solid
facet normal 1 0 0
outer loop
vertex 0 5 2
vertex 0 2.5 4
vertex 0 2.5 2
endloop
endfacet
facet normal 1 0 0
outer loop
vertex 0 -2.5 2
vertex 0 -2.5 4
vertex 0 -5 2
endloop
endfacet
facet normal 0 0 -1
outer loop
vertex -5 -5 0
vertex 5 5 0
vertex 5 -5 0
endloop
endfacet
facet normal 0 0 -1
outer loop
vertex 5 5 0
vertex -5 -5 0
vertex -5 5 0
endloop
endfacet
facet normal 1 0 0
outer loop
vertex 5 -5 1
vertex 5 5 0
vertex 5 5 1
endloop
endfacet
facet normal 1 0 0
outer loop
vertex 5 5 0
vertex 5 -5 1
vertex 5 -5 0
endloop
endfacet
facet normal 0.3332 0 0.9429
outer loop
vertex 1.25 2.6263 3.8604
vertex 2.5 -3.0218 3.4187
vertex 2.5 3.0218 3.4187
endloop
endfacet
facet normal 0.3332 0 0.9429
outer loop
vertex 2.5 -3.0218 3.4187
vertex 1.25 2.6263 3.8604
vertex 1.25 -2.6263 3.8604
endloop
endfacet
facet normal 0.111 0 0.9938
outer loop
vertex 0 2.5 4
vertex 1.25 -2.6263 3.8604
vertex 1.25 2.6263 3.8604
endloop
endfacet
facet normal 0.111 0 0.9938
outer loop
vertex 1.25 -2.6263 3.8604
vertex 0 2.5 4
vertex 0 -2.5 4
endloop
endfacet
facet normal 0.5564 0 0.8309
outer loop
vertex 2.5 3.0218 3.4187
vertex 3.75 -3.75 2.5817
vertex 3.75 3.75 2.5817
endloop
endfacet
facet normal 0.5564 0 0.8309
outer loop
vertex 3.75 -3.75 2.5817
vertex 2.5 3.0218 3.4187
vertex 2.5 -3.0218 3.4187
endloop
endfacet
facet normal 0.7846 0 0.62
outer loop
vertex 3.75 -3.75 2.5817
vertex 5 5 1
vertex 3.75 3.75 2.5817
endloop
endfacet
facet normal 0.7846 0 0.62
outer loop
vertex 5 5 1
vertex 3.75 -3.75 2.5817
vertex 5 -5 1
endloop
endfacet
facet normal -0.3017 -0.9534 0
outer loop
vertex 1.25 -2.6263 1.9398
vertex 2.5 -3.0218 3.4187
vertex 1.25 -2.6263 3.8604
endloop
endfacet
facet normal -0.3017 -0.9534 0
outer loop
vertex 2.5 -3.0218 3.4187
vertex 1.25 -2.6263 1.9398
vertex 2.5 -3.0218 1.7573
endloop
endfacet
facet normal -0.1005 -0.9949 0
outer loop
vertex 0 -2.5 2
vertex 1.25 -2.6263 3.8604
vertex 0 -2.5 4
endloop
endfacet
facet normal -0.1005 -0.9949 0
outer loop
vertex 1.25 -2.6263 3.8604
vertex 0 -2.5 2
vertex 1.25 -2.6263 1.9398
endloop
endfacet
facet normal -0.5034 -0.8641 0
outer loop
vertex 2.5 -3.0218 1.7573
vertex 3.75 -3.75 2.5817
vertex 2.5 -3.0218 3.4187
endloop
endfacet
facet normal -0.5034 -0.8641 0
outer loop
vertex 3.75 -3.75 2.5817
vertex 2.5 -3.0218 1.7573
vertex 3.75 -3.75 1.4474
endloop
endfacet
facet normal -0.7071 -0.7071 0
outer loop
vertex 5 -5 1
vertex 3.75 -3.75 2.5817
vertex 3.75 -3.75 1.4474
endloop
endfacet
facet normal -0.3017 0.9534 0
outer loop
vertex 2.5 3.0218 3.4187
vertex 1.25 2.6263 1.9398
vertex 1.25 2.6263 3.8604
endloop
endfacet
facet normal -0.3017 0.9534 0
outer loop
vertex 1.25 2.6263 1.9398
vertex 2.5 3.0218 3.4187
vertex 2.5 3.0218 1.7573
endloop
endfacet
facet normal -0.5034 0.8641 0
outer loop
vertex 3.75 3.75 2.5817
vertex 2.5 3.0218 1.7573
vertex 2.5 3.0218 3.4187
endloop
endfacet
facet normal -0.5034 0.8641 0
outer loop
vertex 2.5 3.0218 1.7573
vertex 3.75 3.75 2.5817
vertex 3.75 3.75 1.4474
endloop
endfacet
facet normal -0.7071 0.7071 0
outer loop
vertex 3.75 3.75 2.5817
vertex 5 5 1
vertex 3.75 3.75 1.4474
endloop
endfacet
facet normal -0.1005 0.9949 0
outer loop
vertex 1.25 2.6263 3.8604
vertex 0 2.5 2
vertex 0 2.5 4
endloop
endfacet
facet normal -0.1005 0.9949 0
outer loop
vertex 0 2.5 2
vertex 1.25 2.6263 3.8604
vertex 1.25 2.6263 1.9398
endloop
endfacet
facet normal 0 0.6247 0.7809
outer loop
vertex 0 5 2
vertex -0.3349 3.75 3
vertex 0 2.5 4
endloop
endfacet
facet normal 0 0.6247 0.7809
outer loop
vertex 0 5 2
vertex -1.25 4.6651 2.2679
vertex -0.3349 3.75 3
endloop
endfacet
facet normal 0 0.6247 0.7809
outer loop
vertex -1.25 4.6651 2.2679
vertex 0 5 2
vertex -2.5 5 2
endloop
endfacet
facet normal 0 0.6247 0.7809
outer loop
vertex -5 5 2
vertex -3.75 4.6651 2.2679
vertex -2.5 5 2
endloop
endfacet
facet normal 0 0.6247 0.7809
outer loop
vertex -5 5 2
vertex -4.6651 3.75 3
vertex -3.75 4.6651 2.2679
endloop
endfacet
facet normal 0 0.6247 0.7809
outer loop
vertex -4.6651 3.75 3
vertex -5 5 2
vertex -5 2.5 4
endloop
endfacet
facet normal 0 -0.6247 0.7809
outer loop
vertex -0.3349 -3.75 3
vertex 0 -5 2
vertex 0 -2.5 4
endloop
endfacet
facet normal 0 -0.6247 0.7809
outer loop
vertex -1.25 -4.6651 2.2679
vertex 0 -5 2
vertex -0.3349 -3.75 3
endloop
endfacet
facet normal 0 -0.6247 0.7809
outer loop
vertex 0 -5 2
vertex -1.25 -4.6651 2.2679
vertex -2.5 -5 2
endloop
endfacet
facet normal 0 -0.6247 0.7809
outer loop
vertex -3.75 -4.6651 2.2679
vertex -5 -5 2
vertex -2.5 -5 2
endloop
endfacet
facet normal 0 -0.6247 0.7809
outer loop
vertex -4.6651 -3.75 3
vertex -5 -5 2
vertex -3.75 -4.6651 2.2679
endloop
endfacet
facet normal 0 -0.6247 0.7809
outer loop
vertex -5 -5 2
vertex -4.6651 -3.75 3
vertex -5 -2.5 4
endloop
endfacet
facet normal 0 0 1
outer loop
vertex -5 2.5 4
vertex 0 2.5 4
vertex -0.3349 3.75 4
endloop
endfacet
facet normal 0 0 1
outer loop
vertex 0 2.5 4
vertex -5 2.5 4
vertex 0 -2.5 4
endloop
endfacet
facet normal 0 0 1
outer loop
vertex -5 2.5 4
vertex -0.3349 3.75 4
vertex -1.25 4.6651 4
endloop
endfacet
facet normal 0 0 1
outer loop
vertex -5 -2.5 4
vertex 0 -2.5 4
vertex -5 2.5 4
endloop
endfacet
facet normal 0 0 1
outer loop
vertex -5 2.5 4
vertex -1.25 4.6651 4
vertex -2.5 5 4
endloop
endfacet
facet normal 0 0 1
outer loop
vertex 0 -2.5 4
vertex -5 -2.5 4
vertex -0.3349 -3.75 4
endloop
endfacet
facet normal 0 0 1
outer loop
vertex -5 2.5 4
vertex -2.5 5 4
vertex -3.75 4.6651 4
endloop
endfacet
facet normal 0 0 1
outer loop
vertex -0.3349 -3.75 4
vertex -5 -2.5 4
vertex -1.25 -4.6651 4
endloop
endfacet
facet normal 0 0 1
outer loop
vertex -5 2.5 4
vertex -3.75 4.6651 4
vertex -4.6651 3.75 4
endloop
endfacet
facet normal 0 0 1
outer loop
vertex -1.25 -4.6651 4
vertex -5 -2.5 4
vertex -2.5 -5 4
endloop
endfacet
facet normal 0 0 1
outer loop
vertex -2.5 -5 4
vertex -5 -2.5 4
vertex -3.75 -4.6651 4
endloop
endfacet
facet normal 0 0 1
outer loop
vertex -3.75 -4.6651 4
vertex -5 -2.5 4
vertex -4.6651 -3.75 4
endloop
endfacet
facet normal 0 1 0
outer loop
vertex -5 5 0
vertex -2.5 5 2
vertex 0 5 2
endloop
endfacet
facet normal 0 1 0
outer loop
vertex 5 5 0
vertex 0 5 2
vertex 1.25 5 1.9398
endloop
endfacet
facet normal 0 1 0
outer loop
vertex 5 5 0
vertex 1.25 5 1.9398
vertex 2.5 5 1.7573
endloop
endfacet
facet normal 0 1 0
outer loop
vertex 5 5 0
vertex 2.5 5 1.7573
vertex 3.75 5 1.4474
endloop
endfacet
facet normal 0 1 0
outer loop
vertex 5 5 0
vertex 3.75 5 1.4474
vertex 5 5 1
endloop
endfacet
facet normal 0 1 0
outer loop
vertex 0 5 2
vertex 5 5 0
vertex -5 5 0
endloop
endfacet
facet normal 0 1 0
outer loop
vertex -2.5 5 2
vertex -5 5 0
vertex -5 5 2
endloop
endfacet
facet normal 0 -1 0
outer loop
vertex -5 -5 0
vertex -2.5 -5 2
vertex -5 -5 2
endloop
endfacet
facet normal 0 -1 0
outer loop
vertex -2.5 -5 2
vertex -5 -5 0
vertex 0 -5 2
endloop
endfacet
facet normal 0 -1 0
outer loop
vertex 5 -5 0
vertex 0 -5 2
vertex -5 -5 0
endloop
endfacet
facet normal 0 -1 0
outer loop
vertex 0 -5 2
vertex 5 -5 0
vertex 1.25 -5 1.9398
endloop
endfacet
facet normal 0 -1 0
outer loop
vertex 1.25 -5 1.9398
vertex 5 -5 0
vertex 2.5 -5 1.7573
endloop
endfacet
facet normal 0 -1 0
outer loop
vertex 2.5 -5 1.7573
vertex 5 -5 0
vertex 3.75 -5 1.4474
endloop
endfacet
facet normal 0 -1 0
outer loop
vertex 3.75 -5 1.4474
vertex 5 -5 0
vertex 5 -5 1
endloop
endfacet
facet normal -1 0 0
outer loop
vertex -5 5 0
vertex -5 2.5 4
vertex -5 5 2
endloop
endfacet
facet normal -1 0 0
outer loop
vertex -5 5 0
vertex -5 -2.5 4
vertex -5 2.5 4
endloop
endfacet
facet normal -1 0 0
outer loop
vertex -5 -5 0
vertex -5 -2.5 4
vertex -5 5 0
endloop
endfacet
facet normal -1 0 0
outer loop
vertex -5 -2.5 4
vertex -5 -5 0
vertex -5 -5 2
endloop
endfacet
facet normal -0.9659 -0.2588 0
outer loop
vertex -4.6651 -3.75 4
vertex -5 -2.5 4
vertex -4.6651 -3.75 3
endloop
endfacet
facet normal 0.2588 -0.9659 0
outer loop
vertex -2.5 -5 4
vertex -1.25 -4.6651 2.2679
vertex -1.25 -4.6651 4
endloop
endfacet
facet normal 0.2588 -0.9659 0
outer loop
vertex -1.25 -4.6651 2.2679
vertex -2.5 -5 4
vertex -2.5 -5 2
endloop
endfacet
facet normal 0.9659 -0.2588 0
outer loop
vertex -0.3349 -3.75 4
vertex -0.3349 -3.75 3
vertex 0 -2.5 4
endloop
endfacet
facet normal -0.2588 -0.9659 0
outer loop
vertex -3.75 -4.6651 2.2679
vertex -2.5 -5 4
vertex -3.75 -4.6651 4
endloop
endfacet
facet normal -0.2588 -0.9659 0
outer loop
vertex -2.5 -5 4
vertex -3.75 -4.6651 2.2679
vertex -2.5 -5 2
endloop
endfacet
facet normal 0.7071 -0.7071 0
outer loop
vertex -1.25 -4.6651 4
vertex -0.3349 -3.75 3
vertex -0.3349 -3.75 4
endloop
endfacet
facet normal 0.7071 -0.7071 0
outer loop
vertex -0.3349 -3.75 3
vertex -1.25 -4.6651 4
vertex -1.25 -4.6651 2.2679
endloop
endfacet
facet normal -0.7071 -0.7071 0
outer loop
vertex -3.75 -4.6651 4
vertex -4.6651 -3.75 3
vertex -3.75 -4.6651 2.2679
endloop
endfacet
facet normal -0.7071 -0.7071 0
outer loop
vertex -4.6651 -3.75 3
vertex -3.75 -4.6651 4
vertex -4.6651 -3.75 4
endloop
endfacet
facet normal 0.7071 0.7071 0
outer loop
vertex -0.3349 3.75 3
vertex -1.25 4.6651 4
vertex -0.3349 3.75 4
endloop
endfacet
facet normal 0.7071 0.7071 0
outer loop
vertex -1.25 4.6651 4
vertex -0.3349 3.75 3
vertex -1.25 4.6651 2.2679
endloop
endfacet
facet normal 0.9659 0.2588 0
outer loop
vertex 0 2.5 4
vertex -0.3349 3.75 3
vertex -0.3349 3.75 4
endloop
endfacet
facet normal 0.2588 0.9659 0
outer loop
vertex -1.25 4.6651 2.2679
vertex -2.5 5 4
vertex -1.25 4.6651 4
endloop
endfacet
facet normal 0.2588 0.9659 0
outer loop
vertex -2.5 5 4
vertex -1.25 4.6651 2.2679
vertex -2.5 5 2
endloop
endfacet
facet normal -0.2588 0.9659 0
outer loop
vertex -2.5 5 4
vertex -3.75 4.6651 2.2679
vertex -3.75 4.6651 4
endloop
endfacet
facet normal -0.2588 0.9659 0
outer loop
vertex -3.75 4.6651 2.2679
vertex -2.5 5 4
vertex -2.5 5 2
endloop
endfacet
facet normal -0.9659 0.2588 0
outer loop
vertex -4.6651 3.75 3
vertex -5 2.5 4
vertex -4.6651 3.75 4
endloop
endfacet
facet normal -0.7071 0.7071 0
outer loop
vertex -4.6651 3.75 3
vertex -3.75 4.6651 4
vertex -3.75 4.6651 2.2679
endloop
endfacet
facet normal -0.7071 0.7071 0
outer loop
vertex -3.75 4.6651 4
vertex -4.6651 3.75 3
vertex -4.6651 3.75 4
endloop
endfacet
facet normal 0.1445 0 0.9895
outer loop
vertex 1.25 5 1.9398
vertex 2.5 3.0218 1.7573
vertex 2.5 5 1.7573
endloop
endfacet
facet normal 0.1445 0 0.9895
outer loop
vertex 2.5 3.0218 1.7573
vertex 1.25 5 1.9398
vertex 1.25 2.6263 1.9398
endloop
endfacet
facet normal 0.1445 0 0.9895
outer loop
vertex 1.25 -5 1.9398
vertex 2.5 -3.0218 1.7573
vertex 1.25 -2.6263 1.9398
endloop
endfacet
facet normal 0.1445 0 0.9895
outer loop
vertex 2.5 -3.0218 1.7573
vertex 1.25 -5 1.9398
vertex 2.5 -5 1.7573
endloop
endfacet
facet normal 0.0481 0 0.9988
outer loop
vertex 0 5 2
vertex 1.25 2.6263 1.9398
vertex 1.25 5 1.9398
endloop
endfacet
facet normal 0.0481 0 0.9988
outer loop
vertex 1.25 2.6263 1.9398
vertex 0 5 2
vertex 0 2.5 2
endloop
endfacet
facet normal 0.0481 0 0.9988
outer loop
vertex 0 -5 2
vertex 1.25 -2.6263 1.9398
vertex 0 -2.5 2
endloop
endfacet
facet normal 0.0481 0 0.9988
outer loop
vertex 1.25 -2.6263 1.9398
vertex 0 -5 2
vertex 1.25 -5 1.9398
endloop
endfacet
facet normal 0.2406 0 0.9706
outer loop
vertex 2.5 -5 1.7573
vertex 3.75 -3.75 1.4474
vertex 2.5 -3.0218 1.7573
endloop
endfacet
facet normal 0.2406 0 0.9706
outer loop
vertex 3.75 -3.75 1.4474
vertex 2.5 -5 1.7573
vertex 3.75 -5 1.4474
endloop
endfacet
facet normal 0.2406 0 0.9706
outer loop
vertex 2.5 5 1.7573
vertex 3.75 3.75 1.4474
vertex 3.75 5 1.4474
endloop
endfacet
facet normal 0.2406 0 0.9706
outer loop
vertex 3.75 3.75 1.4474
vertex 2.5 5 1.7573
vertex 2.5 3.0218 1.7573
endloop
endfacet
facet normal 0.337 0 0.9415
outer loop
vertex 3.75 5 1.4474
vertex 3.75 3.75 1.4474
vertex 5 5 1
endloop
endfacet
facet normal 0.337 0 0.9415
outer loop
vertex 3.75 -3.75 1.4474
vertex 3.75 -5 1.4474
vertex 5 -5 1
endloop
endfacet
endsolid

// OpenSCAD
// plate 2x2 bow

// external vars #########################

ext_scale = 1.0;

// internal vars #########################

pts_base = [[0,-5],[2,-5],[4,-2.5],[4,2.5],[2,5],[0,5]];

r_big = (sqrt(34)/2)/(3/sqrt(34));
r_big2 = r_big*r_big;
u_big = r_big-3;
pts_big = [
[0,0],[0,4],
[1.25,1+sqrt(r_big2-1.5625)-u_big],
[2.5,1+sqrt(r_big2-6.25)-u_big],
[3.75,1+sqrt(r_big2-14.0625)-u_big],
[5,1],[5,0]
];

r_side = (sqrt(31.25)/2)/(2.5/sqrt(31.25));
r_side2 = r_side*r_side;
u_side = r_side-2.5;
pts_side = [
[-1,-1],[0,2.5],
[1.25,sqrt(r_side2-1.5625)-u_side],
[2.5,sqrt(r_side2-6.25)-u_side],
[3.75,sqrt(r_side2-14.0625)-u_side],
[5,0]
];

r_small = (sqrt(26)/2)/(1/sqrt(26));
r_small2 = r_small*r_small;
u_small = r_small-1;
pts_small = [
[0,0],[0,2],
[1.25,1+sqrt(r_small2-1.5625)-u_small],
[2.5,1+sqrt(r_small2-6.25)-u_small],
[3.75,1+sqrt(r_small2-14.0625)-u_small],
[5,1],[5,0]
];

// part ##################################

scale([ext_scale,ext_scale,ext_scale])
union() {
  rotate([0,-90,0]) linear_extrude(height=5) polygon(pts_base);
  translate([-2.5,-2.5,1]) cylinder(h=3,d=5,center=false,$fn=12);
  translate([-2.5,2.5,1]) cylinder(h=3,d=5,center=false,$fn=12);
  difference() {
    translate([0,5,0]) rotate([90,0,0]) linear_extrude(height=10) polygon(pts_big);
    translate([0,-5,-1]) linear_extrude(height=6) polygon(pts_side);
    translate([0,5,5]) rotate([180,0,0]) linear_extrude(height=6) polygon(pts_side);
  }
  translate([0,5,0]) rotate([90,0,0]) linear_extrude(height=10) polygon(pts_small);
}
